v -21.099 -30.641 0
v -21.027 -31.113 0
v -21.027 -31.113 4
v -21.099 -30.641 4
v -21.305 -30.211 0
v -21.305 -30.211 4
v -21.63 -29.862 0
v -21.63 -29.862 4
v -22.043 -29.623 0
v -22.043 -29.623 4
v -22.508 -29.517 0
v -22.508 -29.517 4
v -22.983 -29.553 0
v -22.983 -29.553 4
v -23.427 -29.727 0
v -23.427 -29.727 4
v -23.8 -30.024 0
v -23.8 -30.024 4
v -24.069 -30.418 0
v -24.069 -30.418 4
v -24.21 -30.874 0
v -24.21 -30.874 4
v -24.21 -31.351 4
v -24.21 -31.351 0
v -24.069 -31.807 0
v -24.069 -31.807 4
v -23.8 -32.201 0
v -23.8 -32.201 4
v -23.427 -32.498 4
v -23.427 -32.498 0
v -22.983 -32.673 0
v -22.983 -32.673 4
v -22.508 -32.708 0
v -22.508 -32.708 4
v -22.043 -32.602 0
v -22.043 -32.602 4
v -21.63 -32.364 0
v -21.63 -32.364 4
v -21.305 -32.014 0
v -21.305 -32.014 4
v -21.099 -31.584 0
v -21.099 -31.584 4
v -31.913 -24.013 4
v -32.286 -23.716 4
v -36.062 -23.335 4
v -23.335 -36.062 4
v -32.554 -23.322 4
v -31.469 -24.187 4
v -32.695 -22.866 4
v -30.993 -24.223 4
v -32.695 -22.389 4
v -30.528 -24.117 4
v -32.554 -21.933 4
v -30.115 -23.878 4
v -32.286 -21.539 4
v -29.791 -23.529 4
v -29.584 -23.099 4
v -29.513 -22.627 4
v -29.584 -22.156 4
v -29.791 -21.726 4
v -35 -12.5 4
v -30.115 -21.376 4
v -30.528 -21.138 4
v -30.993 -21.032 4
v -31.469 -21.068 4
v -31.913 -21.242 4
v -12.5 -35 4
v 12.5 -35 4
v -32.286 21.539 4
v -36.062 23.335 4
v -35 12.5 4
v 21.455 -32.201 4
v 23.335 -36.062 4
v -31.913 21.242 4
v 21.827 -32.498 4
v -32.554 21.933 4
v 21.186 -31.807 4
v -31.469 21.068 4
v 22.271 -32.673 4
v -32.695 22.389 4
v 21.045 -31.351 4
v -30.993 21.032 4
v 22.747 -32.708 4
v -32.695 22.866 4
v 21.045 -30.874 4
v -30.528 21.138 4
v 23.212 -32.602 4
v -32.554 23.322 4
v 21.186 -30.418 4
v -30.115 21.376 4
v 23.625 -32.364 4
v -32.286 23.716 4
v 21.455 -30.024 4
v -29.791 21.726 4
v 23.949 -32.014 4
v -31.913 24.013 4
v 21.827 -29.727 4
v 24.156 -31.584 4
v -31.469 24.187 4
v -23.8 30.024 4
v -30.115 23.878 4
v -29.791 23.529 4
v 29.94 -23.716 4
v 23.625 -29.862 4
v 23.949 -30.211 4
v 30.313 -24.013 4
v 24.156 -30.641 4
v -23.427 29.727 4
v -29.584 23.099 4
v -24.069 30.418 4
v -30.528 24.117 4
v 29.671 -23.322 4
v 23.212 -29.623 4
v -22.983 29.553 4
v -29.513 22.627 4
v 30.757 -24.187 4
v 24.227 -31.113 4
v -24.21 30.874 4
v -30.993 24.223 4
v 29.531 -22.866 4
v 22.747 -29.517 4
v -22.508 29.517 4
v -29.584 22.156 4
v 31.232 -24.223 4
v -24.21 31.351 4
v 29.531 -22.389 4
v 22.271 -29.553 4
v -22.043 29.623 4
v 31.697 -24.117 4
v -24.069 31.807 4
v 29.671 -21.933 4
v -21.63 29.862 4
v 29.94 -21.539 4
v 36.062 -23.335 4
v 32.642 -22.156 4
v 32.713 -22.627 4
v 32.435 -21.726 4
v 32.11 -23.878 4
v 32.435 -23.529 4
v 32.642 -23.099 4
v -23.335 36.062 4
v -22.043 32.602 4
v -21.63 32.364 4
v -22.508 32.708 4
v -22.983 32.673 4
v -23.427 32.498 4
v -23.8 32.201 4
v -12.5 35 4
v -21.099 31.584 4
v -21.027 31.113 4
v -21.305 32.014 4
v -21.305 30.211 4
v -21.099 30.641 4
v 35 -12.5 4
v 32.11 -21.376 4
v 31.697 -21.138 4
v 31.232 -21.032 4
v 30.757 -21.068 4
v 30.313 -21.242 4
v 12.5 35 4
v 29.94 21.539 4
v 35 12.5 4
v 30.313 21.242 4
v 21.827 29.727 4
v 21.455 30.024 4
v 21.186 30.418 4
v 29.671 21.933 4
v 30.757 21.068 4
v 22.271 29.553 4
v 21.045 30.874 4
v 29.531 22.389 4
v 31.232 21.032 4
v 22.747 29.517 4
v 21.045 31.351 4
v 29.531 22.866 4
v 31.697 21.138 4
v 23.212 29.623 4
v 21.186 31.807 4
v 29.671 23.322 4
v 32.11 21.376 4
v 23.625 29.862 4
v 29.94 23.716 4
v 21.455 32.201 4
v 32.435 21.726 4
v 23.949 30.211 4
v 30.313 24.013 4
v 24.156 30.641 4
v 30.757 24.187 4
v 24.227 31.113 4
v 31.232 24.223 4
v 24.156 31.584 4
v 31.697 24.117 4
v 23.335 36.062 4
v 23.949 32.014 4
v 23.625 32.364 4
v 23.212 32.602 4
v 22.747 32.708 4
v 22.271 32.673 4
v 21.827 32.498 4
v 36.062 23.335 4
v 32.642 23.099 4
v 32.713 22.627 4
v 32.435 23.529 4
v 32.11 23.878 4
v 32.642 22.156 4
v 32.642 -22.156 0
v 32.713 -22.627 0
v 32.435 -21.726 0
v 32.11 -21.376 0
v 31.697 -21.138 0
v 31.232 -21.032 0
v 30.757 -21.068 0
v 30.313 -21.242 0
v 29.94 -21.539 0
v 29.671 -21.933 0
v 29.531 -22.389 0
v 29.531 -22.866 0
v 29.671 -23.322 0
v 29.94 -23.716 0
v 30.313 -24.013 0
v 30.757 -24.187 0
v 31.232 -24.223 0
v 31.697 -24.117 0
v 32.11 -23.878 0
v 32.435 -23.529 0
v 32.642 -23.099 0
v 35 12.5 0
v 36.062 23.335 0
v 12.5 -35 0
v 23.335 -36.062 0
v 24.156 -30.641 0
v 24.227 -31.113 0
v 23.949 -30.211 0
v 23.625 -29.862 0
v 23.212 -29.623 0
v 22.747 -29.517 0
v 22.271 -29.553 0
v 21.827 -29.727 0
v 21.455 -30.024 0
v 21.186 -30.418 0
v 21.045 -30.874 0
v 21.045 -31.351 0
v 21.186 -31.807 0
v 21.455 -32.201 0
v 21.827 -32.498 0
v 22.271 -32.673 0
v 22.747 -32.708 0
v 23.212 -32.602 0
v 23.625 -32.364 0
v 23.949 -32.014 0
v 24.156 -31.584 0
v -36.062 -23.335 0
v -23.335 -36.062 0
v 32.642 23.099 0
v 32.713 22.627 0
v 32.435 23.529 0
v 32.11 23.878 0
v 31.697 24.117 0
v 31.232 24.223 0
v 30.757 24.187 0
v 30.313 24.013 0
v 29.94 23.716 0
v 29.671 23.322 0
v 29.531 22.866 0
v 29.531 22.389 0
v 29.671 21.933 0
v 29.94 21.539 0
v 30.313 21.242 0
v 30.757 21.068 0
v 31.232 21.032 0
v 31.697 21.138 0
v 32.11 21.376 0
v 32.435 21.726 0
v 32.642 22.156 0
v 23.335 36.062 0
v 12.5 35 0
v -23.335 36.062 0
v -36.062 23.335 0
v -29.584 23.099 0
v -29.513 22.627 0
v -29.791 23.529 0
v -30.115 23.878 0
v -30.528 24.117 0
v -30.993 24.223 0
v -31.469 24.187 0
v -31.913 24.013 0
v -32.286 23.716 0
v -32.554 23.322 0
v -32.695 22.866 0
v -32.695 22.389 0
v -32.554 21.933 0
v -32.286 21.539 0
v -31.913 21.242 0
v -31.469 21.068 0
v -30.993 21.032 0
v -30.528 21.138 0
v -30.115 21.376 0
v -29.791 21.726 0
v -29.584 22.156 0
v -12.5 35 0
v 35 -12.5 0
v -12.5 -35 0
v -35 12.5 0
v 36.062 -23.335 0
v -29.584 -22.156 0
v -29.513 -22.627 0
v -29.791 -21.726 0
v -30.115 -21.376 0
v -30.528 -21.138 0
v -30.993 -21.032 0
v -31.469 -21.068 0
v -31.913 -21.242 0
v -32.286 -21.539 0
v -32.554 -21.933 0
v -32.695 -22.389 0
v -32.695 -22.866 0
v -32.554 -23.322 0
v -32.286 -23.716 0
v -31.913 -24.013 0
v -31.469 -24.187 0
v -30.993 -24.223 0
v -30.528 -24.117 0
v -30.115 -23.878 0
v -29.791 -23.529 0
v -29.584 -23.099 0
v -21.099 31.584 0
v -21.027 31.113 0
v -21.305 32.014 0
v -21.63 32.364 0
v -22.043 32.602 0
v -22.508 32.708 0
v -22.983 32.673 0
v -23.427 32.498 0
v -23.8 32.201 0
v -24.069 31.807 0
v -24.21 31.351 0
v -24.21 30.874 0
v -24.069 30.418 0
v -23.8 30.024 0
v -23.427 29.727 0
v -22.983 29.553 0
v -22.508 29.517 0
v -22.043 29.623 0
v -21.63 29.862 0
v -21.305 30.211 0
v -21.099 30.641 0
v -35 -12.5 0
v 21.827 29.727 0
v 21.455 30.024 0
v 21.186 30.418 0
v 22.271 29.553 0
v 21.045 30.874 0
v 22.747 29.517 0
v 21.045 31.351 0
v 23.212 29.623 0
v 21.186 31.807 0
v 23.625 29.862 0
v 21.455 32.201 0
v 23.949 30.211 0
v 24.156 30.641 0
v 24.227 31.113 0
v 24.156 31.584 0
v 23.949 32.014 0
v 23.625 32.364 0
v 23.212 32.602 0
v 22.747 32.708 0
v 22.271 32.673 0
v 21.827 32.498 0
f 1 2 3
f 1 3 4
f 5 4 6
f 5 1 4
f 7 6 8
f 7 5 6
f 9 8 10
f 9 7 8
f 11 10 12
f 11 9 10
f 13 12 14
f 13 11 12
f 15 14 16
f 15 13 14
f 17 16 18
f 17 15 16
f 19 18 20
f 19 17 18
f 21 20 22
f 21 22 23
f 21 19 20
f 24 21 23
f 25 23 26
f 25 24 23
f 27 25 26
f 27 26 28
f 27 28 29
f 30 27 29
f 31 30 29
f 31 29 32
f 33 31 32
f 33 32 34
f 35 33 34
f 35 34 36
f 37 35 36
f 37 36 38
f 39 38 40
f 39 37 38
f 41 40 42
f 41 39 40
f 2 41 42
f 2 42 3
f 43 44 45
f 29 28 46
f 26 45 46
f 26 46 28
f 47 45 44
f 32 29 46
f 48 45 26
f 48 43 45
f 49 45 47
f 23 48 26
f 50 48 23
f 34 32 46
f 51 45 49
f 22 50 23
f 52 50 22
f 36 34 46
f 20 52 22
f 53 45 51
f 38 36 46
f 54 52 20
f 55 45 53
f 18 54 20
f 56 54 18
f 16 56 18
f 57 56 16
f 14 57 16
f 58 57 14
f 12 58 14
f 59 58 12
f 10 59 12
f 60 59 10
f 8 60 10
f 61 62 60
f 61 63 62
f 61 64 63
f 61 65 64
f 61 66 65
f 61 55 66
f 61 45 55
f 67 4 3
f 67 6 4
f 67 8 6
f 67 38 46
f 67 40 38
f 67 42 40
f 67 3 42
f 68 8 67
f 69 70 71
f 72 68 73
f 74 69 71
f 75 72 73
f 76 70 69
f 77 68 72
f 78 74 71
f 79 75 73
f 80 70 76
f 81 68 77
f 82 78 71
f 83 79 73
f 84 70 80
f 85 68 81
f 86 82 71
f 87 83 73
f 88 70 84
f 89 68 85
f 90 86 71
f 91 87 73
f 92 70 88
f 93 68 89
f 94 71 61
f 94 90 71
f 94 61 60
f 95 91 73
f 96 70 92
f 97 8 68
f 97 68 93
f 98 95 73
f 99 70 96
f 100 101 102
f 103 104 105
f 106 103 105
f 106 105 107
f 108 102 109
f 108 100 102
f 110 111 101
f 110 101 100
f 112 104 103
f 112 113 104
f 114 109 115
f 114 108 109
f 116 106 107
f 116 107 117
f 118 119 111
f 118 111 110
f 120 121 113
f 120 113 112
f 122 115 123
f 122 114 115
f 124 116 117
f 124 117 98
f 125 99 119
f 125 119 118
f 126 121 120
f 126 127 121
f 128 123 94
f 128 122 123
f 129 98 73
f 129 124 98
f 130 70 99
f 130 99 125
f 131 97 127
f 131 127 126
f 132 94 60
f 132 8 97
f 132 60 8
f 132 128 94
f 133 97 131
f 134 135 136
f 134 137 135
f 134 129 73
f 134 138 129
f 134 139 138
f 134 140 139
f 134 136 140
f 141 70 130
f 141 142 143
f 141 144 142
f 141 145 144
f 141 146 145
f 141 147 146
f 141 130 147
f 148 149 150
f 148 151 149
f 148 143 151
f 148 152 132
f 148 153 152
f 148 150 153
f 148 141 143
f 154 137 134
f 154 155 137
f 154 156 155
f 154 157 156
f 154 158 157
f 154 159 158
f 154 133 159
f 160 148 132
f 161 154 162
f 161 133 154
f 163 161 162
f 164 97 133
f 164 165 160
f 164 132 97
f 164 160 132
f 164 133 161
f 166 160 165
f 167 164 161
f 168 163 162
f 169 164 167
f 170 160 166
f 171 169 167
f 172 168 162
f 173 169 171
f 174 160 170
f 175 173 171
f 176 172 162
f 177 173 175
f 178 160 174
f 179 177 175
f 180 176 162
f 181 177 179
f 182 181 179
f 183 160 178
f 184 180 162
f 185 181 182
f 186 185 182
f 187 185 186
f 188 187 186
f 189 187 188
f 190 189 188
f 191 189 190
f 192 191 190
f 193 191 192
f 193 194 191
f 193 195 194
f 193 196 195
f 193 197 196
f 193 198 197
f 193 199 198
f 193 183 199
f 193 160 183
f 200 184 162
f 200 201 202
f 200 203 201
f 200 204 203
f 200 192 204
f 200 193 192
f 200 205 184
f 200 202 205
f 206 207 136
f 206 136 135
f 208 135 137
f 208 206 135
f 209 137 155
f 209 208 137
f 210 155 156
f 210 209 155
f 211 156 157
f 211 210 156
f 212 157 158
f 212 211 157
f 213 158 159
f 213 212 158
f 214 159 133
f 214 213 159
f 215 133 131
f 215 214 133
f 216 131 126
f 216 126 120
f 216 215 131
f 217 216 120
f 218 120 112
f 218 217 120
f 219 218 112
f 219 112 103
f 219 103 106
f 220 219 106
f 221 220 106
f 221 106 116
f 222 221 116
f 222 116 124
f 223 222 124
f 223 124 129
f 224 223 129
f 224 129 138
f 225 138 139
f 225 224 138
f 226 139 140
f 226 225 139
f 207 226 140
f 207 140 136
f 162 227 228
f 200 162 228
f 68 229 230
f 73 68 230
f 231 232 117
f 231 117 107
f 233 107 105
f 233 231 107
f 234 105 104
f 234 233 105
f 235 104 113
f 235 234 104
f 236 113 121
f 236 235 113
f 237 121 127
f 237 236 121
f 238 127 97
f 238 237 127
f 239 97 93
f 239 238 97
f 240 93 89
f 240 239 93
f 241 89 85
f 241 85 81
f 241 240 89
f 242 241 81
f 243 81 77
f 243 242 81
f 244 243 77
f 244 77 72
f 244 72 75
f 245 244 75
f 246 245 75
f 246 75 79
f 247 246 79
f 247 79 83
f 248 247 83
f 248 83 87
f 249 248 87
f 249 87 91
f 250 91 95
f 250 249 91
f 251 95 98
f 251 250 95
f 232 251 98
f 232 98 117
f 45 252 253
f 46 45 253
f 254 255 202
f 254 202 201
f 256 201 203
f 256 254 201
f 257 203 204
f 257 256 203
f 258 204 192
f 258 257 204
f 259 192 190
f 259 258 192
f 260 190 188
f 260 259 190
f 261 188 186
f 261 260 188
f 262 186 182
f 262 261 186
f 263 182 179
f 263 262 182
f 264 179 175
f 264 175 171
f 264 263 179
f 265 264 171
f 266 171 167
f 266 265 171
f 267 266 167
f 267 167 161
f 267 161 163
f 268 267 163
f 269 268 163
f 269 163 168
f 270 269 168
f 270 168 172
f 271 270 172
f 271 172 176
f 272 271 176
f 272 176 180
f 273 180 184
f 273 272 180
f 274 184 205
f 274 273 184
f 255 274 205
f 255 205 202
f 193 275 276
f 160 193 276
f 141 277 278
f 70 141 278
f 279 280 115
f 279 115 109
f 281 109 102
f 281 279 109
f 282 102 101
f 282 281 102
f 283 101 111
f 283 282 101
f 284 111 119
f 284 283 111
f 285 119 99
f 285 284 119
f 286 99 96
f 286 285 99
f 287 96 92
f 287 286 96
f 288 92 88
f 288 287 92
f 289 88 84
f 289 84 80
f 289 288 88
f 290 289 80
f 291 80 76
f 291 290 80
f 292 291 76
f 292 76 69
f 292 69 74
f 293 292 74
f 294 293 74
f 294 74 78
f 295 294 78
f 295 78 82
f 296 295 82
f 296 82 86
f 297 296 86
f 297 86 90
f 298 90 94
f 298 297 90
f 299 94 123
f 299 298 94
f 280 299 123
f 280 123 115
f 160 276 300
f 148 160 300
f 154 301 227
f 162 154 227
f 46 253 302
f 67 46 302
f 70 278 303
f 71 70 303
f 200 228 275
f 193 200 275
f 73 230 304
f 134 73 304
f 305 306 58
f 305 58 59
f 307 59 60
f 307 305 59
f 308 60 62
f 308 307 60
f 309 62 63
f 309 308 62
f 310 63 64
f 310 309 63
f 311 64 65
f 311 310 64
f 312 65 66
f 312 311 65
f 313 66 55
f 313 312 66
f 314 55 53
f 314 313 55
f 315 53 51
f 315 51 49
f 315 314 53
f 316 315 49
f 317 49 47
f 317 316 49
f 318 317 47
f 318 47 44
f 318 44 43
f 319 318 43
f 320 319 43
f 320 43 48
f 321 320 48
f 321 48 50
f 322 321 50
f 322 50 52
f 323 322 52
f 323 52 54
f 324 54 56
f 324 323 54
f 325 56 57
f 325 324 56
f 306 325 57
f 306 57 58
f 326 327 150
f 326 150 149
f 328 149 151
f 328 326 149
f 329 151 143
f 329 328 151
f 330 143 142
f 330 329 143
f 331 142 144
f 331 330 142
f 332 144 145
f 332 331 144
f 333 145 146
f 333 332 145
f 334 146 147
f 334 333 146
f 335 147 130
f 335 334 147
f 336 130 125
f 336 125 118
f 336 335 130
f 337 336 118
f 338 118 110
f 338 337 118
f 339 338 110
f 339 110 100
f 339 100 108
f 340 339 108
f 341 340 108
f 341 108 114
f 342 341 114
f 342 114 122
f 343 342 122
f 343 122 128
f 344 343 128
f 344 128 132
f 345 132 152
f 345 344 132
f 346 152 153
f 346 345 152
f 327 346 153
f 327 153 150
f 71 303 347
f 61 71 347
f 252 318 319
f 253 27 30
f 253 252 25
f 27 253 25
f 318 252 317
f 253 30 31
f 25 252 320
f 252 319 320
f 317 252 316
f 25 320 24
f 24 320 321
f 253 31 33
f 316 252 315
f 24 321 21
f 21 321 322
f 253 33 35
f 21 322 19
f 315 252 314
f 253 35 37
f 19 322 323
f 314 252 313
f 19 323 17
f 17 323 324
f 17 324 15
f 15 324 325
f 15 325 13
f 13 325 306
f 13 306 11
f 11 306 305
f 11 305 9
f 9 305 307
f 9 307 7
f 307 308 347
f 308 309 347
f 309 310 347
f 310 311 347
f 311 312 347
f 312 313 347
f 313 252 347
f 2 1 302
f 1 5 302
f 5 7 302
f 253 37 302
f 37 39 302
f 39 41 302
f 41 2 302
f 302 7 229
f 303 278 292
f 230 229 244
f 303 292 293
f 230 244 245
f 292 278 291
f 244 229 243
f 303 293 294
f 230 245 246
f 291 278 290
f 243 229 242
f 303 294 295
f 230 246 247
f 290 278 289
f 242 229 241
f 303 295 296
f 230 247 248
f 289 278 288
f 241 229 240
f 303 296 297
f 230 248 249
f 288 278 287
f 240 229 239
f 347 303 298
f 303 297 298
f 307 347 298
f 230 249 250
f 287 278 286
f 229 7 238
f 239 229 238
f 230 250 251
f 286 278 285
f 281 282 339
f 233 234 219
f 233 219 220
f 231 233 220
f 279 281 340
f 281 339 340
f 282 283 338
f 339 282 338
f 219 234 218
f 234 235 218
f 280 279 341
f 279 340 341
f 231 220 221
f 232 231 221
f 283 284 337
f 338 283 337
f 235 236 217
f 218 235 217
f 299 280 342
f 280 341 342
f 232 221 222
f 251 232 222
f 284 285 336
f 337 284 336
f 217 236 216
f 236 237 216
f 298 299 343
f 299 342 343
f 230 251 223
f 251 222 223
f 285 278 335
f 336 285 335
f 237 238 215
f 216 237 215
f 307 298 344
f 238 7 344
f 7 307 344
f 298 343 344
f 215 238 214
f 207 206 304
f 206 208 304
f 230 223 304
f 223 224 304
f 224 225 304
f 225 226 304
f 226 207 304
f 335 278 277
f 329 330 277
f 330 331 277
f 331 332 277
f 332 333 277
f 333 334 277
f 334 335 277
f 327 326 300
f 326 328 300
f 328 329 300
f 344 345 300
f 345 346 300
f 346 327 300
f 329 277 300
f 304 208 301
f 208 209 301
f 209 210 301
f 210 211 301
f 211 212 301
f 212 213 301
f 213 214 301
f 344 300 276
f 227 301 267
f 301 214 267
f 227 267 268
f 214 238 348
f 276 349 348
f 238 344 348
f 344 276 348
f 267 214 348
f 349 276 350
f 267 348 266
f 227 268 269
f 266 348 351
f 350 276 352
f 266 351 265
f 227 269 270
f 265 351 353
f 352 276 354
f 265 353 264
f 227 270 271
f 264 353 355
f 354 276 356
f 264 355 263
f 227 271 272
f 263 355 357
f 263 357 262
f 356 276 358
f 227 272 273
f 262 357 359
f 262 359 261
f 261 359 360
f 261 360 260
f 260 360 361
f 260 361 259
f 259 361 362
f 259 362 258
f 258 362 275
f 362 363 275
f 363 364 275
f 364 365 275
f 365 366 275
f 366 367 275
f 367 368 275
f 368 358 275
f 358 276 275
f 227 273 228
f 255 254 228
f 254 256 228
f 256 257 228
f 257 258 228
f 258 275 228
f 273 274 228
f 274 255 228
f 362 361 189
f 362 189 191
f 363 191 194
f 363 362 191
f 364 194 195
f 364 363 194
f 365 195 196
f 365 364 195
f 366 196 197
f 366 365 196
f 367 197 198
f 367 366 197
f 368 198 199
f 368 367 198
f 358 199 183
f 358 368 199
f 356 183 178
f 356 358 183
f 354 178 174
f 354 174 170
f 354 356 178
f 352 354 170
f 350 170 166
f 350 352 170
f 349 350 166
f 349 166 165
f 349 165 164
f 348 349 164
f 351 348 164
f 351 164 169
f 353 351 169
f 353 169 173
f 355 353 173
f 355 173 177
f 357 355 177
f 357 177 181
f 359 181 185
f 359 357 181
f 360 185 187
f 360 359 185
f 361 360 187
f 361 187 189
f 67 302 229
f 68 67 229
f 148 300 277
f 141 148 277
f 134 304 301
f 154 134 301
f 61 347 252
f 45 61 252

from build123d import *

# Parameters (mm, degrees)
SKETCH1_R           = 1.6
BOSS_EXTRUDE1_DEPTH = 4


with BuildPart() as part:
    # Sketch1 → Boss-Extrude1 (new body)
    with BuildSketch(Plane.XY):
        Polygon((12.5, 35), (-12.5, 35), (-23.334523779, 36.062445841), (-36.062445841, 23.334523779), (-35, 12.5), (-35, -12.5), (-36.062445841, -23.334523779), (-23.334523779, -36.062445841), (-12.5, -35), (12.5, -35), (23.334523779, -36.062445841), (36.062445841, -23.334523779), (35, -12.5), (35, 12.5), (36.062445841, 23.334523779), (23.334523779, 36.062445841), align=None)
        with Locations((22.627416998, 31.112698372)):
            Circle(SKETCH1_R, mode=Mode.SUBTRACT)
        with Locations((31.112698372, 22.627416998)):
            Circle(SKETCH1_R, mode=Mode.SUBTRACT)
        with Locations((22.627416998, -31.112698372)):
            Circle(SKETCH1_R, mode=Mode.SUBTRACT)
        with Locations((31.112698372, -22.627416998)):
            Circle(SKETCH1_R, mode=Mode.SUBTRACT)
        with Locations((-31.112698372, -22.627416998)):
            Circle(SKETCH1_R, mode=Mode.SUBTRACT)
        with Locations((-22.627416998, -31.112698372)):
            Circle(SKETCH1_R, mode=Mode.SUBTRACT)
        with Locations((-22.627416998, 31.112698372)):
            Circle(SKETCH1_R, mode=Mode.SUBTRACT)
        with Locations((-31.112698372, 22.627416998)):
            Circle(SKETCH1_R, mode=Mode.SUBTRACT)
    extrude(amount=BOSS_EXTRUDE1_DEPTH)


solid = part.part
